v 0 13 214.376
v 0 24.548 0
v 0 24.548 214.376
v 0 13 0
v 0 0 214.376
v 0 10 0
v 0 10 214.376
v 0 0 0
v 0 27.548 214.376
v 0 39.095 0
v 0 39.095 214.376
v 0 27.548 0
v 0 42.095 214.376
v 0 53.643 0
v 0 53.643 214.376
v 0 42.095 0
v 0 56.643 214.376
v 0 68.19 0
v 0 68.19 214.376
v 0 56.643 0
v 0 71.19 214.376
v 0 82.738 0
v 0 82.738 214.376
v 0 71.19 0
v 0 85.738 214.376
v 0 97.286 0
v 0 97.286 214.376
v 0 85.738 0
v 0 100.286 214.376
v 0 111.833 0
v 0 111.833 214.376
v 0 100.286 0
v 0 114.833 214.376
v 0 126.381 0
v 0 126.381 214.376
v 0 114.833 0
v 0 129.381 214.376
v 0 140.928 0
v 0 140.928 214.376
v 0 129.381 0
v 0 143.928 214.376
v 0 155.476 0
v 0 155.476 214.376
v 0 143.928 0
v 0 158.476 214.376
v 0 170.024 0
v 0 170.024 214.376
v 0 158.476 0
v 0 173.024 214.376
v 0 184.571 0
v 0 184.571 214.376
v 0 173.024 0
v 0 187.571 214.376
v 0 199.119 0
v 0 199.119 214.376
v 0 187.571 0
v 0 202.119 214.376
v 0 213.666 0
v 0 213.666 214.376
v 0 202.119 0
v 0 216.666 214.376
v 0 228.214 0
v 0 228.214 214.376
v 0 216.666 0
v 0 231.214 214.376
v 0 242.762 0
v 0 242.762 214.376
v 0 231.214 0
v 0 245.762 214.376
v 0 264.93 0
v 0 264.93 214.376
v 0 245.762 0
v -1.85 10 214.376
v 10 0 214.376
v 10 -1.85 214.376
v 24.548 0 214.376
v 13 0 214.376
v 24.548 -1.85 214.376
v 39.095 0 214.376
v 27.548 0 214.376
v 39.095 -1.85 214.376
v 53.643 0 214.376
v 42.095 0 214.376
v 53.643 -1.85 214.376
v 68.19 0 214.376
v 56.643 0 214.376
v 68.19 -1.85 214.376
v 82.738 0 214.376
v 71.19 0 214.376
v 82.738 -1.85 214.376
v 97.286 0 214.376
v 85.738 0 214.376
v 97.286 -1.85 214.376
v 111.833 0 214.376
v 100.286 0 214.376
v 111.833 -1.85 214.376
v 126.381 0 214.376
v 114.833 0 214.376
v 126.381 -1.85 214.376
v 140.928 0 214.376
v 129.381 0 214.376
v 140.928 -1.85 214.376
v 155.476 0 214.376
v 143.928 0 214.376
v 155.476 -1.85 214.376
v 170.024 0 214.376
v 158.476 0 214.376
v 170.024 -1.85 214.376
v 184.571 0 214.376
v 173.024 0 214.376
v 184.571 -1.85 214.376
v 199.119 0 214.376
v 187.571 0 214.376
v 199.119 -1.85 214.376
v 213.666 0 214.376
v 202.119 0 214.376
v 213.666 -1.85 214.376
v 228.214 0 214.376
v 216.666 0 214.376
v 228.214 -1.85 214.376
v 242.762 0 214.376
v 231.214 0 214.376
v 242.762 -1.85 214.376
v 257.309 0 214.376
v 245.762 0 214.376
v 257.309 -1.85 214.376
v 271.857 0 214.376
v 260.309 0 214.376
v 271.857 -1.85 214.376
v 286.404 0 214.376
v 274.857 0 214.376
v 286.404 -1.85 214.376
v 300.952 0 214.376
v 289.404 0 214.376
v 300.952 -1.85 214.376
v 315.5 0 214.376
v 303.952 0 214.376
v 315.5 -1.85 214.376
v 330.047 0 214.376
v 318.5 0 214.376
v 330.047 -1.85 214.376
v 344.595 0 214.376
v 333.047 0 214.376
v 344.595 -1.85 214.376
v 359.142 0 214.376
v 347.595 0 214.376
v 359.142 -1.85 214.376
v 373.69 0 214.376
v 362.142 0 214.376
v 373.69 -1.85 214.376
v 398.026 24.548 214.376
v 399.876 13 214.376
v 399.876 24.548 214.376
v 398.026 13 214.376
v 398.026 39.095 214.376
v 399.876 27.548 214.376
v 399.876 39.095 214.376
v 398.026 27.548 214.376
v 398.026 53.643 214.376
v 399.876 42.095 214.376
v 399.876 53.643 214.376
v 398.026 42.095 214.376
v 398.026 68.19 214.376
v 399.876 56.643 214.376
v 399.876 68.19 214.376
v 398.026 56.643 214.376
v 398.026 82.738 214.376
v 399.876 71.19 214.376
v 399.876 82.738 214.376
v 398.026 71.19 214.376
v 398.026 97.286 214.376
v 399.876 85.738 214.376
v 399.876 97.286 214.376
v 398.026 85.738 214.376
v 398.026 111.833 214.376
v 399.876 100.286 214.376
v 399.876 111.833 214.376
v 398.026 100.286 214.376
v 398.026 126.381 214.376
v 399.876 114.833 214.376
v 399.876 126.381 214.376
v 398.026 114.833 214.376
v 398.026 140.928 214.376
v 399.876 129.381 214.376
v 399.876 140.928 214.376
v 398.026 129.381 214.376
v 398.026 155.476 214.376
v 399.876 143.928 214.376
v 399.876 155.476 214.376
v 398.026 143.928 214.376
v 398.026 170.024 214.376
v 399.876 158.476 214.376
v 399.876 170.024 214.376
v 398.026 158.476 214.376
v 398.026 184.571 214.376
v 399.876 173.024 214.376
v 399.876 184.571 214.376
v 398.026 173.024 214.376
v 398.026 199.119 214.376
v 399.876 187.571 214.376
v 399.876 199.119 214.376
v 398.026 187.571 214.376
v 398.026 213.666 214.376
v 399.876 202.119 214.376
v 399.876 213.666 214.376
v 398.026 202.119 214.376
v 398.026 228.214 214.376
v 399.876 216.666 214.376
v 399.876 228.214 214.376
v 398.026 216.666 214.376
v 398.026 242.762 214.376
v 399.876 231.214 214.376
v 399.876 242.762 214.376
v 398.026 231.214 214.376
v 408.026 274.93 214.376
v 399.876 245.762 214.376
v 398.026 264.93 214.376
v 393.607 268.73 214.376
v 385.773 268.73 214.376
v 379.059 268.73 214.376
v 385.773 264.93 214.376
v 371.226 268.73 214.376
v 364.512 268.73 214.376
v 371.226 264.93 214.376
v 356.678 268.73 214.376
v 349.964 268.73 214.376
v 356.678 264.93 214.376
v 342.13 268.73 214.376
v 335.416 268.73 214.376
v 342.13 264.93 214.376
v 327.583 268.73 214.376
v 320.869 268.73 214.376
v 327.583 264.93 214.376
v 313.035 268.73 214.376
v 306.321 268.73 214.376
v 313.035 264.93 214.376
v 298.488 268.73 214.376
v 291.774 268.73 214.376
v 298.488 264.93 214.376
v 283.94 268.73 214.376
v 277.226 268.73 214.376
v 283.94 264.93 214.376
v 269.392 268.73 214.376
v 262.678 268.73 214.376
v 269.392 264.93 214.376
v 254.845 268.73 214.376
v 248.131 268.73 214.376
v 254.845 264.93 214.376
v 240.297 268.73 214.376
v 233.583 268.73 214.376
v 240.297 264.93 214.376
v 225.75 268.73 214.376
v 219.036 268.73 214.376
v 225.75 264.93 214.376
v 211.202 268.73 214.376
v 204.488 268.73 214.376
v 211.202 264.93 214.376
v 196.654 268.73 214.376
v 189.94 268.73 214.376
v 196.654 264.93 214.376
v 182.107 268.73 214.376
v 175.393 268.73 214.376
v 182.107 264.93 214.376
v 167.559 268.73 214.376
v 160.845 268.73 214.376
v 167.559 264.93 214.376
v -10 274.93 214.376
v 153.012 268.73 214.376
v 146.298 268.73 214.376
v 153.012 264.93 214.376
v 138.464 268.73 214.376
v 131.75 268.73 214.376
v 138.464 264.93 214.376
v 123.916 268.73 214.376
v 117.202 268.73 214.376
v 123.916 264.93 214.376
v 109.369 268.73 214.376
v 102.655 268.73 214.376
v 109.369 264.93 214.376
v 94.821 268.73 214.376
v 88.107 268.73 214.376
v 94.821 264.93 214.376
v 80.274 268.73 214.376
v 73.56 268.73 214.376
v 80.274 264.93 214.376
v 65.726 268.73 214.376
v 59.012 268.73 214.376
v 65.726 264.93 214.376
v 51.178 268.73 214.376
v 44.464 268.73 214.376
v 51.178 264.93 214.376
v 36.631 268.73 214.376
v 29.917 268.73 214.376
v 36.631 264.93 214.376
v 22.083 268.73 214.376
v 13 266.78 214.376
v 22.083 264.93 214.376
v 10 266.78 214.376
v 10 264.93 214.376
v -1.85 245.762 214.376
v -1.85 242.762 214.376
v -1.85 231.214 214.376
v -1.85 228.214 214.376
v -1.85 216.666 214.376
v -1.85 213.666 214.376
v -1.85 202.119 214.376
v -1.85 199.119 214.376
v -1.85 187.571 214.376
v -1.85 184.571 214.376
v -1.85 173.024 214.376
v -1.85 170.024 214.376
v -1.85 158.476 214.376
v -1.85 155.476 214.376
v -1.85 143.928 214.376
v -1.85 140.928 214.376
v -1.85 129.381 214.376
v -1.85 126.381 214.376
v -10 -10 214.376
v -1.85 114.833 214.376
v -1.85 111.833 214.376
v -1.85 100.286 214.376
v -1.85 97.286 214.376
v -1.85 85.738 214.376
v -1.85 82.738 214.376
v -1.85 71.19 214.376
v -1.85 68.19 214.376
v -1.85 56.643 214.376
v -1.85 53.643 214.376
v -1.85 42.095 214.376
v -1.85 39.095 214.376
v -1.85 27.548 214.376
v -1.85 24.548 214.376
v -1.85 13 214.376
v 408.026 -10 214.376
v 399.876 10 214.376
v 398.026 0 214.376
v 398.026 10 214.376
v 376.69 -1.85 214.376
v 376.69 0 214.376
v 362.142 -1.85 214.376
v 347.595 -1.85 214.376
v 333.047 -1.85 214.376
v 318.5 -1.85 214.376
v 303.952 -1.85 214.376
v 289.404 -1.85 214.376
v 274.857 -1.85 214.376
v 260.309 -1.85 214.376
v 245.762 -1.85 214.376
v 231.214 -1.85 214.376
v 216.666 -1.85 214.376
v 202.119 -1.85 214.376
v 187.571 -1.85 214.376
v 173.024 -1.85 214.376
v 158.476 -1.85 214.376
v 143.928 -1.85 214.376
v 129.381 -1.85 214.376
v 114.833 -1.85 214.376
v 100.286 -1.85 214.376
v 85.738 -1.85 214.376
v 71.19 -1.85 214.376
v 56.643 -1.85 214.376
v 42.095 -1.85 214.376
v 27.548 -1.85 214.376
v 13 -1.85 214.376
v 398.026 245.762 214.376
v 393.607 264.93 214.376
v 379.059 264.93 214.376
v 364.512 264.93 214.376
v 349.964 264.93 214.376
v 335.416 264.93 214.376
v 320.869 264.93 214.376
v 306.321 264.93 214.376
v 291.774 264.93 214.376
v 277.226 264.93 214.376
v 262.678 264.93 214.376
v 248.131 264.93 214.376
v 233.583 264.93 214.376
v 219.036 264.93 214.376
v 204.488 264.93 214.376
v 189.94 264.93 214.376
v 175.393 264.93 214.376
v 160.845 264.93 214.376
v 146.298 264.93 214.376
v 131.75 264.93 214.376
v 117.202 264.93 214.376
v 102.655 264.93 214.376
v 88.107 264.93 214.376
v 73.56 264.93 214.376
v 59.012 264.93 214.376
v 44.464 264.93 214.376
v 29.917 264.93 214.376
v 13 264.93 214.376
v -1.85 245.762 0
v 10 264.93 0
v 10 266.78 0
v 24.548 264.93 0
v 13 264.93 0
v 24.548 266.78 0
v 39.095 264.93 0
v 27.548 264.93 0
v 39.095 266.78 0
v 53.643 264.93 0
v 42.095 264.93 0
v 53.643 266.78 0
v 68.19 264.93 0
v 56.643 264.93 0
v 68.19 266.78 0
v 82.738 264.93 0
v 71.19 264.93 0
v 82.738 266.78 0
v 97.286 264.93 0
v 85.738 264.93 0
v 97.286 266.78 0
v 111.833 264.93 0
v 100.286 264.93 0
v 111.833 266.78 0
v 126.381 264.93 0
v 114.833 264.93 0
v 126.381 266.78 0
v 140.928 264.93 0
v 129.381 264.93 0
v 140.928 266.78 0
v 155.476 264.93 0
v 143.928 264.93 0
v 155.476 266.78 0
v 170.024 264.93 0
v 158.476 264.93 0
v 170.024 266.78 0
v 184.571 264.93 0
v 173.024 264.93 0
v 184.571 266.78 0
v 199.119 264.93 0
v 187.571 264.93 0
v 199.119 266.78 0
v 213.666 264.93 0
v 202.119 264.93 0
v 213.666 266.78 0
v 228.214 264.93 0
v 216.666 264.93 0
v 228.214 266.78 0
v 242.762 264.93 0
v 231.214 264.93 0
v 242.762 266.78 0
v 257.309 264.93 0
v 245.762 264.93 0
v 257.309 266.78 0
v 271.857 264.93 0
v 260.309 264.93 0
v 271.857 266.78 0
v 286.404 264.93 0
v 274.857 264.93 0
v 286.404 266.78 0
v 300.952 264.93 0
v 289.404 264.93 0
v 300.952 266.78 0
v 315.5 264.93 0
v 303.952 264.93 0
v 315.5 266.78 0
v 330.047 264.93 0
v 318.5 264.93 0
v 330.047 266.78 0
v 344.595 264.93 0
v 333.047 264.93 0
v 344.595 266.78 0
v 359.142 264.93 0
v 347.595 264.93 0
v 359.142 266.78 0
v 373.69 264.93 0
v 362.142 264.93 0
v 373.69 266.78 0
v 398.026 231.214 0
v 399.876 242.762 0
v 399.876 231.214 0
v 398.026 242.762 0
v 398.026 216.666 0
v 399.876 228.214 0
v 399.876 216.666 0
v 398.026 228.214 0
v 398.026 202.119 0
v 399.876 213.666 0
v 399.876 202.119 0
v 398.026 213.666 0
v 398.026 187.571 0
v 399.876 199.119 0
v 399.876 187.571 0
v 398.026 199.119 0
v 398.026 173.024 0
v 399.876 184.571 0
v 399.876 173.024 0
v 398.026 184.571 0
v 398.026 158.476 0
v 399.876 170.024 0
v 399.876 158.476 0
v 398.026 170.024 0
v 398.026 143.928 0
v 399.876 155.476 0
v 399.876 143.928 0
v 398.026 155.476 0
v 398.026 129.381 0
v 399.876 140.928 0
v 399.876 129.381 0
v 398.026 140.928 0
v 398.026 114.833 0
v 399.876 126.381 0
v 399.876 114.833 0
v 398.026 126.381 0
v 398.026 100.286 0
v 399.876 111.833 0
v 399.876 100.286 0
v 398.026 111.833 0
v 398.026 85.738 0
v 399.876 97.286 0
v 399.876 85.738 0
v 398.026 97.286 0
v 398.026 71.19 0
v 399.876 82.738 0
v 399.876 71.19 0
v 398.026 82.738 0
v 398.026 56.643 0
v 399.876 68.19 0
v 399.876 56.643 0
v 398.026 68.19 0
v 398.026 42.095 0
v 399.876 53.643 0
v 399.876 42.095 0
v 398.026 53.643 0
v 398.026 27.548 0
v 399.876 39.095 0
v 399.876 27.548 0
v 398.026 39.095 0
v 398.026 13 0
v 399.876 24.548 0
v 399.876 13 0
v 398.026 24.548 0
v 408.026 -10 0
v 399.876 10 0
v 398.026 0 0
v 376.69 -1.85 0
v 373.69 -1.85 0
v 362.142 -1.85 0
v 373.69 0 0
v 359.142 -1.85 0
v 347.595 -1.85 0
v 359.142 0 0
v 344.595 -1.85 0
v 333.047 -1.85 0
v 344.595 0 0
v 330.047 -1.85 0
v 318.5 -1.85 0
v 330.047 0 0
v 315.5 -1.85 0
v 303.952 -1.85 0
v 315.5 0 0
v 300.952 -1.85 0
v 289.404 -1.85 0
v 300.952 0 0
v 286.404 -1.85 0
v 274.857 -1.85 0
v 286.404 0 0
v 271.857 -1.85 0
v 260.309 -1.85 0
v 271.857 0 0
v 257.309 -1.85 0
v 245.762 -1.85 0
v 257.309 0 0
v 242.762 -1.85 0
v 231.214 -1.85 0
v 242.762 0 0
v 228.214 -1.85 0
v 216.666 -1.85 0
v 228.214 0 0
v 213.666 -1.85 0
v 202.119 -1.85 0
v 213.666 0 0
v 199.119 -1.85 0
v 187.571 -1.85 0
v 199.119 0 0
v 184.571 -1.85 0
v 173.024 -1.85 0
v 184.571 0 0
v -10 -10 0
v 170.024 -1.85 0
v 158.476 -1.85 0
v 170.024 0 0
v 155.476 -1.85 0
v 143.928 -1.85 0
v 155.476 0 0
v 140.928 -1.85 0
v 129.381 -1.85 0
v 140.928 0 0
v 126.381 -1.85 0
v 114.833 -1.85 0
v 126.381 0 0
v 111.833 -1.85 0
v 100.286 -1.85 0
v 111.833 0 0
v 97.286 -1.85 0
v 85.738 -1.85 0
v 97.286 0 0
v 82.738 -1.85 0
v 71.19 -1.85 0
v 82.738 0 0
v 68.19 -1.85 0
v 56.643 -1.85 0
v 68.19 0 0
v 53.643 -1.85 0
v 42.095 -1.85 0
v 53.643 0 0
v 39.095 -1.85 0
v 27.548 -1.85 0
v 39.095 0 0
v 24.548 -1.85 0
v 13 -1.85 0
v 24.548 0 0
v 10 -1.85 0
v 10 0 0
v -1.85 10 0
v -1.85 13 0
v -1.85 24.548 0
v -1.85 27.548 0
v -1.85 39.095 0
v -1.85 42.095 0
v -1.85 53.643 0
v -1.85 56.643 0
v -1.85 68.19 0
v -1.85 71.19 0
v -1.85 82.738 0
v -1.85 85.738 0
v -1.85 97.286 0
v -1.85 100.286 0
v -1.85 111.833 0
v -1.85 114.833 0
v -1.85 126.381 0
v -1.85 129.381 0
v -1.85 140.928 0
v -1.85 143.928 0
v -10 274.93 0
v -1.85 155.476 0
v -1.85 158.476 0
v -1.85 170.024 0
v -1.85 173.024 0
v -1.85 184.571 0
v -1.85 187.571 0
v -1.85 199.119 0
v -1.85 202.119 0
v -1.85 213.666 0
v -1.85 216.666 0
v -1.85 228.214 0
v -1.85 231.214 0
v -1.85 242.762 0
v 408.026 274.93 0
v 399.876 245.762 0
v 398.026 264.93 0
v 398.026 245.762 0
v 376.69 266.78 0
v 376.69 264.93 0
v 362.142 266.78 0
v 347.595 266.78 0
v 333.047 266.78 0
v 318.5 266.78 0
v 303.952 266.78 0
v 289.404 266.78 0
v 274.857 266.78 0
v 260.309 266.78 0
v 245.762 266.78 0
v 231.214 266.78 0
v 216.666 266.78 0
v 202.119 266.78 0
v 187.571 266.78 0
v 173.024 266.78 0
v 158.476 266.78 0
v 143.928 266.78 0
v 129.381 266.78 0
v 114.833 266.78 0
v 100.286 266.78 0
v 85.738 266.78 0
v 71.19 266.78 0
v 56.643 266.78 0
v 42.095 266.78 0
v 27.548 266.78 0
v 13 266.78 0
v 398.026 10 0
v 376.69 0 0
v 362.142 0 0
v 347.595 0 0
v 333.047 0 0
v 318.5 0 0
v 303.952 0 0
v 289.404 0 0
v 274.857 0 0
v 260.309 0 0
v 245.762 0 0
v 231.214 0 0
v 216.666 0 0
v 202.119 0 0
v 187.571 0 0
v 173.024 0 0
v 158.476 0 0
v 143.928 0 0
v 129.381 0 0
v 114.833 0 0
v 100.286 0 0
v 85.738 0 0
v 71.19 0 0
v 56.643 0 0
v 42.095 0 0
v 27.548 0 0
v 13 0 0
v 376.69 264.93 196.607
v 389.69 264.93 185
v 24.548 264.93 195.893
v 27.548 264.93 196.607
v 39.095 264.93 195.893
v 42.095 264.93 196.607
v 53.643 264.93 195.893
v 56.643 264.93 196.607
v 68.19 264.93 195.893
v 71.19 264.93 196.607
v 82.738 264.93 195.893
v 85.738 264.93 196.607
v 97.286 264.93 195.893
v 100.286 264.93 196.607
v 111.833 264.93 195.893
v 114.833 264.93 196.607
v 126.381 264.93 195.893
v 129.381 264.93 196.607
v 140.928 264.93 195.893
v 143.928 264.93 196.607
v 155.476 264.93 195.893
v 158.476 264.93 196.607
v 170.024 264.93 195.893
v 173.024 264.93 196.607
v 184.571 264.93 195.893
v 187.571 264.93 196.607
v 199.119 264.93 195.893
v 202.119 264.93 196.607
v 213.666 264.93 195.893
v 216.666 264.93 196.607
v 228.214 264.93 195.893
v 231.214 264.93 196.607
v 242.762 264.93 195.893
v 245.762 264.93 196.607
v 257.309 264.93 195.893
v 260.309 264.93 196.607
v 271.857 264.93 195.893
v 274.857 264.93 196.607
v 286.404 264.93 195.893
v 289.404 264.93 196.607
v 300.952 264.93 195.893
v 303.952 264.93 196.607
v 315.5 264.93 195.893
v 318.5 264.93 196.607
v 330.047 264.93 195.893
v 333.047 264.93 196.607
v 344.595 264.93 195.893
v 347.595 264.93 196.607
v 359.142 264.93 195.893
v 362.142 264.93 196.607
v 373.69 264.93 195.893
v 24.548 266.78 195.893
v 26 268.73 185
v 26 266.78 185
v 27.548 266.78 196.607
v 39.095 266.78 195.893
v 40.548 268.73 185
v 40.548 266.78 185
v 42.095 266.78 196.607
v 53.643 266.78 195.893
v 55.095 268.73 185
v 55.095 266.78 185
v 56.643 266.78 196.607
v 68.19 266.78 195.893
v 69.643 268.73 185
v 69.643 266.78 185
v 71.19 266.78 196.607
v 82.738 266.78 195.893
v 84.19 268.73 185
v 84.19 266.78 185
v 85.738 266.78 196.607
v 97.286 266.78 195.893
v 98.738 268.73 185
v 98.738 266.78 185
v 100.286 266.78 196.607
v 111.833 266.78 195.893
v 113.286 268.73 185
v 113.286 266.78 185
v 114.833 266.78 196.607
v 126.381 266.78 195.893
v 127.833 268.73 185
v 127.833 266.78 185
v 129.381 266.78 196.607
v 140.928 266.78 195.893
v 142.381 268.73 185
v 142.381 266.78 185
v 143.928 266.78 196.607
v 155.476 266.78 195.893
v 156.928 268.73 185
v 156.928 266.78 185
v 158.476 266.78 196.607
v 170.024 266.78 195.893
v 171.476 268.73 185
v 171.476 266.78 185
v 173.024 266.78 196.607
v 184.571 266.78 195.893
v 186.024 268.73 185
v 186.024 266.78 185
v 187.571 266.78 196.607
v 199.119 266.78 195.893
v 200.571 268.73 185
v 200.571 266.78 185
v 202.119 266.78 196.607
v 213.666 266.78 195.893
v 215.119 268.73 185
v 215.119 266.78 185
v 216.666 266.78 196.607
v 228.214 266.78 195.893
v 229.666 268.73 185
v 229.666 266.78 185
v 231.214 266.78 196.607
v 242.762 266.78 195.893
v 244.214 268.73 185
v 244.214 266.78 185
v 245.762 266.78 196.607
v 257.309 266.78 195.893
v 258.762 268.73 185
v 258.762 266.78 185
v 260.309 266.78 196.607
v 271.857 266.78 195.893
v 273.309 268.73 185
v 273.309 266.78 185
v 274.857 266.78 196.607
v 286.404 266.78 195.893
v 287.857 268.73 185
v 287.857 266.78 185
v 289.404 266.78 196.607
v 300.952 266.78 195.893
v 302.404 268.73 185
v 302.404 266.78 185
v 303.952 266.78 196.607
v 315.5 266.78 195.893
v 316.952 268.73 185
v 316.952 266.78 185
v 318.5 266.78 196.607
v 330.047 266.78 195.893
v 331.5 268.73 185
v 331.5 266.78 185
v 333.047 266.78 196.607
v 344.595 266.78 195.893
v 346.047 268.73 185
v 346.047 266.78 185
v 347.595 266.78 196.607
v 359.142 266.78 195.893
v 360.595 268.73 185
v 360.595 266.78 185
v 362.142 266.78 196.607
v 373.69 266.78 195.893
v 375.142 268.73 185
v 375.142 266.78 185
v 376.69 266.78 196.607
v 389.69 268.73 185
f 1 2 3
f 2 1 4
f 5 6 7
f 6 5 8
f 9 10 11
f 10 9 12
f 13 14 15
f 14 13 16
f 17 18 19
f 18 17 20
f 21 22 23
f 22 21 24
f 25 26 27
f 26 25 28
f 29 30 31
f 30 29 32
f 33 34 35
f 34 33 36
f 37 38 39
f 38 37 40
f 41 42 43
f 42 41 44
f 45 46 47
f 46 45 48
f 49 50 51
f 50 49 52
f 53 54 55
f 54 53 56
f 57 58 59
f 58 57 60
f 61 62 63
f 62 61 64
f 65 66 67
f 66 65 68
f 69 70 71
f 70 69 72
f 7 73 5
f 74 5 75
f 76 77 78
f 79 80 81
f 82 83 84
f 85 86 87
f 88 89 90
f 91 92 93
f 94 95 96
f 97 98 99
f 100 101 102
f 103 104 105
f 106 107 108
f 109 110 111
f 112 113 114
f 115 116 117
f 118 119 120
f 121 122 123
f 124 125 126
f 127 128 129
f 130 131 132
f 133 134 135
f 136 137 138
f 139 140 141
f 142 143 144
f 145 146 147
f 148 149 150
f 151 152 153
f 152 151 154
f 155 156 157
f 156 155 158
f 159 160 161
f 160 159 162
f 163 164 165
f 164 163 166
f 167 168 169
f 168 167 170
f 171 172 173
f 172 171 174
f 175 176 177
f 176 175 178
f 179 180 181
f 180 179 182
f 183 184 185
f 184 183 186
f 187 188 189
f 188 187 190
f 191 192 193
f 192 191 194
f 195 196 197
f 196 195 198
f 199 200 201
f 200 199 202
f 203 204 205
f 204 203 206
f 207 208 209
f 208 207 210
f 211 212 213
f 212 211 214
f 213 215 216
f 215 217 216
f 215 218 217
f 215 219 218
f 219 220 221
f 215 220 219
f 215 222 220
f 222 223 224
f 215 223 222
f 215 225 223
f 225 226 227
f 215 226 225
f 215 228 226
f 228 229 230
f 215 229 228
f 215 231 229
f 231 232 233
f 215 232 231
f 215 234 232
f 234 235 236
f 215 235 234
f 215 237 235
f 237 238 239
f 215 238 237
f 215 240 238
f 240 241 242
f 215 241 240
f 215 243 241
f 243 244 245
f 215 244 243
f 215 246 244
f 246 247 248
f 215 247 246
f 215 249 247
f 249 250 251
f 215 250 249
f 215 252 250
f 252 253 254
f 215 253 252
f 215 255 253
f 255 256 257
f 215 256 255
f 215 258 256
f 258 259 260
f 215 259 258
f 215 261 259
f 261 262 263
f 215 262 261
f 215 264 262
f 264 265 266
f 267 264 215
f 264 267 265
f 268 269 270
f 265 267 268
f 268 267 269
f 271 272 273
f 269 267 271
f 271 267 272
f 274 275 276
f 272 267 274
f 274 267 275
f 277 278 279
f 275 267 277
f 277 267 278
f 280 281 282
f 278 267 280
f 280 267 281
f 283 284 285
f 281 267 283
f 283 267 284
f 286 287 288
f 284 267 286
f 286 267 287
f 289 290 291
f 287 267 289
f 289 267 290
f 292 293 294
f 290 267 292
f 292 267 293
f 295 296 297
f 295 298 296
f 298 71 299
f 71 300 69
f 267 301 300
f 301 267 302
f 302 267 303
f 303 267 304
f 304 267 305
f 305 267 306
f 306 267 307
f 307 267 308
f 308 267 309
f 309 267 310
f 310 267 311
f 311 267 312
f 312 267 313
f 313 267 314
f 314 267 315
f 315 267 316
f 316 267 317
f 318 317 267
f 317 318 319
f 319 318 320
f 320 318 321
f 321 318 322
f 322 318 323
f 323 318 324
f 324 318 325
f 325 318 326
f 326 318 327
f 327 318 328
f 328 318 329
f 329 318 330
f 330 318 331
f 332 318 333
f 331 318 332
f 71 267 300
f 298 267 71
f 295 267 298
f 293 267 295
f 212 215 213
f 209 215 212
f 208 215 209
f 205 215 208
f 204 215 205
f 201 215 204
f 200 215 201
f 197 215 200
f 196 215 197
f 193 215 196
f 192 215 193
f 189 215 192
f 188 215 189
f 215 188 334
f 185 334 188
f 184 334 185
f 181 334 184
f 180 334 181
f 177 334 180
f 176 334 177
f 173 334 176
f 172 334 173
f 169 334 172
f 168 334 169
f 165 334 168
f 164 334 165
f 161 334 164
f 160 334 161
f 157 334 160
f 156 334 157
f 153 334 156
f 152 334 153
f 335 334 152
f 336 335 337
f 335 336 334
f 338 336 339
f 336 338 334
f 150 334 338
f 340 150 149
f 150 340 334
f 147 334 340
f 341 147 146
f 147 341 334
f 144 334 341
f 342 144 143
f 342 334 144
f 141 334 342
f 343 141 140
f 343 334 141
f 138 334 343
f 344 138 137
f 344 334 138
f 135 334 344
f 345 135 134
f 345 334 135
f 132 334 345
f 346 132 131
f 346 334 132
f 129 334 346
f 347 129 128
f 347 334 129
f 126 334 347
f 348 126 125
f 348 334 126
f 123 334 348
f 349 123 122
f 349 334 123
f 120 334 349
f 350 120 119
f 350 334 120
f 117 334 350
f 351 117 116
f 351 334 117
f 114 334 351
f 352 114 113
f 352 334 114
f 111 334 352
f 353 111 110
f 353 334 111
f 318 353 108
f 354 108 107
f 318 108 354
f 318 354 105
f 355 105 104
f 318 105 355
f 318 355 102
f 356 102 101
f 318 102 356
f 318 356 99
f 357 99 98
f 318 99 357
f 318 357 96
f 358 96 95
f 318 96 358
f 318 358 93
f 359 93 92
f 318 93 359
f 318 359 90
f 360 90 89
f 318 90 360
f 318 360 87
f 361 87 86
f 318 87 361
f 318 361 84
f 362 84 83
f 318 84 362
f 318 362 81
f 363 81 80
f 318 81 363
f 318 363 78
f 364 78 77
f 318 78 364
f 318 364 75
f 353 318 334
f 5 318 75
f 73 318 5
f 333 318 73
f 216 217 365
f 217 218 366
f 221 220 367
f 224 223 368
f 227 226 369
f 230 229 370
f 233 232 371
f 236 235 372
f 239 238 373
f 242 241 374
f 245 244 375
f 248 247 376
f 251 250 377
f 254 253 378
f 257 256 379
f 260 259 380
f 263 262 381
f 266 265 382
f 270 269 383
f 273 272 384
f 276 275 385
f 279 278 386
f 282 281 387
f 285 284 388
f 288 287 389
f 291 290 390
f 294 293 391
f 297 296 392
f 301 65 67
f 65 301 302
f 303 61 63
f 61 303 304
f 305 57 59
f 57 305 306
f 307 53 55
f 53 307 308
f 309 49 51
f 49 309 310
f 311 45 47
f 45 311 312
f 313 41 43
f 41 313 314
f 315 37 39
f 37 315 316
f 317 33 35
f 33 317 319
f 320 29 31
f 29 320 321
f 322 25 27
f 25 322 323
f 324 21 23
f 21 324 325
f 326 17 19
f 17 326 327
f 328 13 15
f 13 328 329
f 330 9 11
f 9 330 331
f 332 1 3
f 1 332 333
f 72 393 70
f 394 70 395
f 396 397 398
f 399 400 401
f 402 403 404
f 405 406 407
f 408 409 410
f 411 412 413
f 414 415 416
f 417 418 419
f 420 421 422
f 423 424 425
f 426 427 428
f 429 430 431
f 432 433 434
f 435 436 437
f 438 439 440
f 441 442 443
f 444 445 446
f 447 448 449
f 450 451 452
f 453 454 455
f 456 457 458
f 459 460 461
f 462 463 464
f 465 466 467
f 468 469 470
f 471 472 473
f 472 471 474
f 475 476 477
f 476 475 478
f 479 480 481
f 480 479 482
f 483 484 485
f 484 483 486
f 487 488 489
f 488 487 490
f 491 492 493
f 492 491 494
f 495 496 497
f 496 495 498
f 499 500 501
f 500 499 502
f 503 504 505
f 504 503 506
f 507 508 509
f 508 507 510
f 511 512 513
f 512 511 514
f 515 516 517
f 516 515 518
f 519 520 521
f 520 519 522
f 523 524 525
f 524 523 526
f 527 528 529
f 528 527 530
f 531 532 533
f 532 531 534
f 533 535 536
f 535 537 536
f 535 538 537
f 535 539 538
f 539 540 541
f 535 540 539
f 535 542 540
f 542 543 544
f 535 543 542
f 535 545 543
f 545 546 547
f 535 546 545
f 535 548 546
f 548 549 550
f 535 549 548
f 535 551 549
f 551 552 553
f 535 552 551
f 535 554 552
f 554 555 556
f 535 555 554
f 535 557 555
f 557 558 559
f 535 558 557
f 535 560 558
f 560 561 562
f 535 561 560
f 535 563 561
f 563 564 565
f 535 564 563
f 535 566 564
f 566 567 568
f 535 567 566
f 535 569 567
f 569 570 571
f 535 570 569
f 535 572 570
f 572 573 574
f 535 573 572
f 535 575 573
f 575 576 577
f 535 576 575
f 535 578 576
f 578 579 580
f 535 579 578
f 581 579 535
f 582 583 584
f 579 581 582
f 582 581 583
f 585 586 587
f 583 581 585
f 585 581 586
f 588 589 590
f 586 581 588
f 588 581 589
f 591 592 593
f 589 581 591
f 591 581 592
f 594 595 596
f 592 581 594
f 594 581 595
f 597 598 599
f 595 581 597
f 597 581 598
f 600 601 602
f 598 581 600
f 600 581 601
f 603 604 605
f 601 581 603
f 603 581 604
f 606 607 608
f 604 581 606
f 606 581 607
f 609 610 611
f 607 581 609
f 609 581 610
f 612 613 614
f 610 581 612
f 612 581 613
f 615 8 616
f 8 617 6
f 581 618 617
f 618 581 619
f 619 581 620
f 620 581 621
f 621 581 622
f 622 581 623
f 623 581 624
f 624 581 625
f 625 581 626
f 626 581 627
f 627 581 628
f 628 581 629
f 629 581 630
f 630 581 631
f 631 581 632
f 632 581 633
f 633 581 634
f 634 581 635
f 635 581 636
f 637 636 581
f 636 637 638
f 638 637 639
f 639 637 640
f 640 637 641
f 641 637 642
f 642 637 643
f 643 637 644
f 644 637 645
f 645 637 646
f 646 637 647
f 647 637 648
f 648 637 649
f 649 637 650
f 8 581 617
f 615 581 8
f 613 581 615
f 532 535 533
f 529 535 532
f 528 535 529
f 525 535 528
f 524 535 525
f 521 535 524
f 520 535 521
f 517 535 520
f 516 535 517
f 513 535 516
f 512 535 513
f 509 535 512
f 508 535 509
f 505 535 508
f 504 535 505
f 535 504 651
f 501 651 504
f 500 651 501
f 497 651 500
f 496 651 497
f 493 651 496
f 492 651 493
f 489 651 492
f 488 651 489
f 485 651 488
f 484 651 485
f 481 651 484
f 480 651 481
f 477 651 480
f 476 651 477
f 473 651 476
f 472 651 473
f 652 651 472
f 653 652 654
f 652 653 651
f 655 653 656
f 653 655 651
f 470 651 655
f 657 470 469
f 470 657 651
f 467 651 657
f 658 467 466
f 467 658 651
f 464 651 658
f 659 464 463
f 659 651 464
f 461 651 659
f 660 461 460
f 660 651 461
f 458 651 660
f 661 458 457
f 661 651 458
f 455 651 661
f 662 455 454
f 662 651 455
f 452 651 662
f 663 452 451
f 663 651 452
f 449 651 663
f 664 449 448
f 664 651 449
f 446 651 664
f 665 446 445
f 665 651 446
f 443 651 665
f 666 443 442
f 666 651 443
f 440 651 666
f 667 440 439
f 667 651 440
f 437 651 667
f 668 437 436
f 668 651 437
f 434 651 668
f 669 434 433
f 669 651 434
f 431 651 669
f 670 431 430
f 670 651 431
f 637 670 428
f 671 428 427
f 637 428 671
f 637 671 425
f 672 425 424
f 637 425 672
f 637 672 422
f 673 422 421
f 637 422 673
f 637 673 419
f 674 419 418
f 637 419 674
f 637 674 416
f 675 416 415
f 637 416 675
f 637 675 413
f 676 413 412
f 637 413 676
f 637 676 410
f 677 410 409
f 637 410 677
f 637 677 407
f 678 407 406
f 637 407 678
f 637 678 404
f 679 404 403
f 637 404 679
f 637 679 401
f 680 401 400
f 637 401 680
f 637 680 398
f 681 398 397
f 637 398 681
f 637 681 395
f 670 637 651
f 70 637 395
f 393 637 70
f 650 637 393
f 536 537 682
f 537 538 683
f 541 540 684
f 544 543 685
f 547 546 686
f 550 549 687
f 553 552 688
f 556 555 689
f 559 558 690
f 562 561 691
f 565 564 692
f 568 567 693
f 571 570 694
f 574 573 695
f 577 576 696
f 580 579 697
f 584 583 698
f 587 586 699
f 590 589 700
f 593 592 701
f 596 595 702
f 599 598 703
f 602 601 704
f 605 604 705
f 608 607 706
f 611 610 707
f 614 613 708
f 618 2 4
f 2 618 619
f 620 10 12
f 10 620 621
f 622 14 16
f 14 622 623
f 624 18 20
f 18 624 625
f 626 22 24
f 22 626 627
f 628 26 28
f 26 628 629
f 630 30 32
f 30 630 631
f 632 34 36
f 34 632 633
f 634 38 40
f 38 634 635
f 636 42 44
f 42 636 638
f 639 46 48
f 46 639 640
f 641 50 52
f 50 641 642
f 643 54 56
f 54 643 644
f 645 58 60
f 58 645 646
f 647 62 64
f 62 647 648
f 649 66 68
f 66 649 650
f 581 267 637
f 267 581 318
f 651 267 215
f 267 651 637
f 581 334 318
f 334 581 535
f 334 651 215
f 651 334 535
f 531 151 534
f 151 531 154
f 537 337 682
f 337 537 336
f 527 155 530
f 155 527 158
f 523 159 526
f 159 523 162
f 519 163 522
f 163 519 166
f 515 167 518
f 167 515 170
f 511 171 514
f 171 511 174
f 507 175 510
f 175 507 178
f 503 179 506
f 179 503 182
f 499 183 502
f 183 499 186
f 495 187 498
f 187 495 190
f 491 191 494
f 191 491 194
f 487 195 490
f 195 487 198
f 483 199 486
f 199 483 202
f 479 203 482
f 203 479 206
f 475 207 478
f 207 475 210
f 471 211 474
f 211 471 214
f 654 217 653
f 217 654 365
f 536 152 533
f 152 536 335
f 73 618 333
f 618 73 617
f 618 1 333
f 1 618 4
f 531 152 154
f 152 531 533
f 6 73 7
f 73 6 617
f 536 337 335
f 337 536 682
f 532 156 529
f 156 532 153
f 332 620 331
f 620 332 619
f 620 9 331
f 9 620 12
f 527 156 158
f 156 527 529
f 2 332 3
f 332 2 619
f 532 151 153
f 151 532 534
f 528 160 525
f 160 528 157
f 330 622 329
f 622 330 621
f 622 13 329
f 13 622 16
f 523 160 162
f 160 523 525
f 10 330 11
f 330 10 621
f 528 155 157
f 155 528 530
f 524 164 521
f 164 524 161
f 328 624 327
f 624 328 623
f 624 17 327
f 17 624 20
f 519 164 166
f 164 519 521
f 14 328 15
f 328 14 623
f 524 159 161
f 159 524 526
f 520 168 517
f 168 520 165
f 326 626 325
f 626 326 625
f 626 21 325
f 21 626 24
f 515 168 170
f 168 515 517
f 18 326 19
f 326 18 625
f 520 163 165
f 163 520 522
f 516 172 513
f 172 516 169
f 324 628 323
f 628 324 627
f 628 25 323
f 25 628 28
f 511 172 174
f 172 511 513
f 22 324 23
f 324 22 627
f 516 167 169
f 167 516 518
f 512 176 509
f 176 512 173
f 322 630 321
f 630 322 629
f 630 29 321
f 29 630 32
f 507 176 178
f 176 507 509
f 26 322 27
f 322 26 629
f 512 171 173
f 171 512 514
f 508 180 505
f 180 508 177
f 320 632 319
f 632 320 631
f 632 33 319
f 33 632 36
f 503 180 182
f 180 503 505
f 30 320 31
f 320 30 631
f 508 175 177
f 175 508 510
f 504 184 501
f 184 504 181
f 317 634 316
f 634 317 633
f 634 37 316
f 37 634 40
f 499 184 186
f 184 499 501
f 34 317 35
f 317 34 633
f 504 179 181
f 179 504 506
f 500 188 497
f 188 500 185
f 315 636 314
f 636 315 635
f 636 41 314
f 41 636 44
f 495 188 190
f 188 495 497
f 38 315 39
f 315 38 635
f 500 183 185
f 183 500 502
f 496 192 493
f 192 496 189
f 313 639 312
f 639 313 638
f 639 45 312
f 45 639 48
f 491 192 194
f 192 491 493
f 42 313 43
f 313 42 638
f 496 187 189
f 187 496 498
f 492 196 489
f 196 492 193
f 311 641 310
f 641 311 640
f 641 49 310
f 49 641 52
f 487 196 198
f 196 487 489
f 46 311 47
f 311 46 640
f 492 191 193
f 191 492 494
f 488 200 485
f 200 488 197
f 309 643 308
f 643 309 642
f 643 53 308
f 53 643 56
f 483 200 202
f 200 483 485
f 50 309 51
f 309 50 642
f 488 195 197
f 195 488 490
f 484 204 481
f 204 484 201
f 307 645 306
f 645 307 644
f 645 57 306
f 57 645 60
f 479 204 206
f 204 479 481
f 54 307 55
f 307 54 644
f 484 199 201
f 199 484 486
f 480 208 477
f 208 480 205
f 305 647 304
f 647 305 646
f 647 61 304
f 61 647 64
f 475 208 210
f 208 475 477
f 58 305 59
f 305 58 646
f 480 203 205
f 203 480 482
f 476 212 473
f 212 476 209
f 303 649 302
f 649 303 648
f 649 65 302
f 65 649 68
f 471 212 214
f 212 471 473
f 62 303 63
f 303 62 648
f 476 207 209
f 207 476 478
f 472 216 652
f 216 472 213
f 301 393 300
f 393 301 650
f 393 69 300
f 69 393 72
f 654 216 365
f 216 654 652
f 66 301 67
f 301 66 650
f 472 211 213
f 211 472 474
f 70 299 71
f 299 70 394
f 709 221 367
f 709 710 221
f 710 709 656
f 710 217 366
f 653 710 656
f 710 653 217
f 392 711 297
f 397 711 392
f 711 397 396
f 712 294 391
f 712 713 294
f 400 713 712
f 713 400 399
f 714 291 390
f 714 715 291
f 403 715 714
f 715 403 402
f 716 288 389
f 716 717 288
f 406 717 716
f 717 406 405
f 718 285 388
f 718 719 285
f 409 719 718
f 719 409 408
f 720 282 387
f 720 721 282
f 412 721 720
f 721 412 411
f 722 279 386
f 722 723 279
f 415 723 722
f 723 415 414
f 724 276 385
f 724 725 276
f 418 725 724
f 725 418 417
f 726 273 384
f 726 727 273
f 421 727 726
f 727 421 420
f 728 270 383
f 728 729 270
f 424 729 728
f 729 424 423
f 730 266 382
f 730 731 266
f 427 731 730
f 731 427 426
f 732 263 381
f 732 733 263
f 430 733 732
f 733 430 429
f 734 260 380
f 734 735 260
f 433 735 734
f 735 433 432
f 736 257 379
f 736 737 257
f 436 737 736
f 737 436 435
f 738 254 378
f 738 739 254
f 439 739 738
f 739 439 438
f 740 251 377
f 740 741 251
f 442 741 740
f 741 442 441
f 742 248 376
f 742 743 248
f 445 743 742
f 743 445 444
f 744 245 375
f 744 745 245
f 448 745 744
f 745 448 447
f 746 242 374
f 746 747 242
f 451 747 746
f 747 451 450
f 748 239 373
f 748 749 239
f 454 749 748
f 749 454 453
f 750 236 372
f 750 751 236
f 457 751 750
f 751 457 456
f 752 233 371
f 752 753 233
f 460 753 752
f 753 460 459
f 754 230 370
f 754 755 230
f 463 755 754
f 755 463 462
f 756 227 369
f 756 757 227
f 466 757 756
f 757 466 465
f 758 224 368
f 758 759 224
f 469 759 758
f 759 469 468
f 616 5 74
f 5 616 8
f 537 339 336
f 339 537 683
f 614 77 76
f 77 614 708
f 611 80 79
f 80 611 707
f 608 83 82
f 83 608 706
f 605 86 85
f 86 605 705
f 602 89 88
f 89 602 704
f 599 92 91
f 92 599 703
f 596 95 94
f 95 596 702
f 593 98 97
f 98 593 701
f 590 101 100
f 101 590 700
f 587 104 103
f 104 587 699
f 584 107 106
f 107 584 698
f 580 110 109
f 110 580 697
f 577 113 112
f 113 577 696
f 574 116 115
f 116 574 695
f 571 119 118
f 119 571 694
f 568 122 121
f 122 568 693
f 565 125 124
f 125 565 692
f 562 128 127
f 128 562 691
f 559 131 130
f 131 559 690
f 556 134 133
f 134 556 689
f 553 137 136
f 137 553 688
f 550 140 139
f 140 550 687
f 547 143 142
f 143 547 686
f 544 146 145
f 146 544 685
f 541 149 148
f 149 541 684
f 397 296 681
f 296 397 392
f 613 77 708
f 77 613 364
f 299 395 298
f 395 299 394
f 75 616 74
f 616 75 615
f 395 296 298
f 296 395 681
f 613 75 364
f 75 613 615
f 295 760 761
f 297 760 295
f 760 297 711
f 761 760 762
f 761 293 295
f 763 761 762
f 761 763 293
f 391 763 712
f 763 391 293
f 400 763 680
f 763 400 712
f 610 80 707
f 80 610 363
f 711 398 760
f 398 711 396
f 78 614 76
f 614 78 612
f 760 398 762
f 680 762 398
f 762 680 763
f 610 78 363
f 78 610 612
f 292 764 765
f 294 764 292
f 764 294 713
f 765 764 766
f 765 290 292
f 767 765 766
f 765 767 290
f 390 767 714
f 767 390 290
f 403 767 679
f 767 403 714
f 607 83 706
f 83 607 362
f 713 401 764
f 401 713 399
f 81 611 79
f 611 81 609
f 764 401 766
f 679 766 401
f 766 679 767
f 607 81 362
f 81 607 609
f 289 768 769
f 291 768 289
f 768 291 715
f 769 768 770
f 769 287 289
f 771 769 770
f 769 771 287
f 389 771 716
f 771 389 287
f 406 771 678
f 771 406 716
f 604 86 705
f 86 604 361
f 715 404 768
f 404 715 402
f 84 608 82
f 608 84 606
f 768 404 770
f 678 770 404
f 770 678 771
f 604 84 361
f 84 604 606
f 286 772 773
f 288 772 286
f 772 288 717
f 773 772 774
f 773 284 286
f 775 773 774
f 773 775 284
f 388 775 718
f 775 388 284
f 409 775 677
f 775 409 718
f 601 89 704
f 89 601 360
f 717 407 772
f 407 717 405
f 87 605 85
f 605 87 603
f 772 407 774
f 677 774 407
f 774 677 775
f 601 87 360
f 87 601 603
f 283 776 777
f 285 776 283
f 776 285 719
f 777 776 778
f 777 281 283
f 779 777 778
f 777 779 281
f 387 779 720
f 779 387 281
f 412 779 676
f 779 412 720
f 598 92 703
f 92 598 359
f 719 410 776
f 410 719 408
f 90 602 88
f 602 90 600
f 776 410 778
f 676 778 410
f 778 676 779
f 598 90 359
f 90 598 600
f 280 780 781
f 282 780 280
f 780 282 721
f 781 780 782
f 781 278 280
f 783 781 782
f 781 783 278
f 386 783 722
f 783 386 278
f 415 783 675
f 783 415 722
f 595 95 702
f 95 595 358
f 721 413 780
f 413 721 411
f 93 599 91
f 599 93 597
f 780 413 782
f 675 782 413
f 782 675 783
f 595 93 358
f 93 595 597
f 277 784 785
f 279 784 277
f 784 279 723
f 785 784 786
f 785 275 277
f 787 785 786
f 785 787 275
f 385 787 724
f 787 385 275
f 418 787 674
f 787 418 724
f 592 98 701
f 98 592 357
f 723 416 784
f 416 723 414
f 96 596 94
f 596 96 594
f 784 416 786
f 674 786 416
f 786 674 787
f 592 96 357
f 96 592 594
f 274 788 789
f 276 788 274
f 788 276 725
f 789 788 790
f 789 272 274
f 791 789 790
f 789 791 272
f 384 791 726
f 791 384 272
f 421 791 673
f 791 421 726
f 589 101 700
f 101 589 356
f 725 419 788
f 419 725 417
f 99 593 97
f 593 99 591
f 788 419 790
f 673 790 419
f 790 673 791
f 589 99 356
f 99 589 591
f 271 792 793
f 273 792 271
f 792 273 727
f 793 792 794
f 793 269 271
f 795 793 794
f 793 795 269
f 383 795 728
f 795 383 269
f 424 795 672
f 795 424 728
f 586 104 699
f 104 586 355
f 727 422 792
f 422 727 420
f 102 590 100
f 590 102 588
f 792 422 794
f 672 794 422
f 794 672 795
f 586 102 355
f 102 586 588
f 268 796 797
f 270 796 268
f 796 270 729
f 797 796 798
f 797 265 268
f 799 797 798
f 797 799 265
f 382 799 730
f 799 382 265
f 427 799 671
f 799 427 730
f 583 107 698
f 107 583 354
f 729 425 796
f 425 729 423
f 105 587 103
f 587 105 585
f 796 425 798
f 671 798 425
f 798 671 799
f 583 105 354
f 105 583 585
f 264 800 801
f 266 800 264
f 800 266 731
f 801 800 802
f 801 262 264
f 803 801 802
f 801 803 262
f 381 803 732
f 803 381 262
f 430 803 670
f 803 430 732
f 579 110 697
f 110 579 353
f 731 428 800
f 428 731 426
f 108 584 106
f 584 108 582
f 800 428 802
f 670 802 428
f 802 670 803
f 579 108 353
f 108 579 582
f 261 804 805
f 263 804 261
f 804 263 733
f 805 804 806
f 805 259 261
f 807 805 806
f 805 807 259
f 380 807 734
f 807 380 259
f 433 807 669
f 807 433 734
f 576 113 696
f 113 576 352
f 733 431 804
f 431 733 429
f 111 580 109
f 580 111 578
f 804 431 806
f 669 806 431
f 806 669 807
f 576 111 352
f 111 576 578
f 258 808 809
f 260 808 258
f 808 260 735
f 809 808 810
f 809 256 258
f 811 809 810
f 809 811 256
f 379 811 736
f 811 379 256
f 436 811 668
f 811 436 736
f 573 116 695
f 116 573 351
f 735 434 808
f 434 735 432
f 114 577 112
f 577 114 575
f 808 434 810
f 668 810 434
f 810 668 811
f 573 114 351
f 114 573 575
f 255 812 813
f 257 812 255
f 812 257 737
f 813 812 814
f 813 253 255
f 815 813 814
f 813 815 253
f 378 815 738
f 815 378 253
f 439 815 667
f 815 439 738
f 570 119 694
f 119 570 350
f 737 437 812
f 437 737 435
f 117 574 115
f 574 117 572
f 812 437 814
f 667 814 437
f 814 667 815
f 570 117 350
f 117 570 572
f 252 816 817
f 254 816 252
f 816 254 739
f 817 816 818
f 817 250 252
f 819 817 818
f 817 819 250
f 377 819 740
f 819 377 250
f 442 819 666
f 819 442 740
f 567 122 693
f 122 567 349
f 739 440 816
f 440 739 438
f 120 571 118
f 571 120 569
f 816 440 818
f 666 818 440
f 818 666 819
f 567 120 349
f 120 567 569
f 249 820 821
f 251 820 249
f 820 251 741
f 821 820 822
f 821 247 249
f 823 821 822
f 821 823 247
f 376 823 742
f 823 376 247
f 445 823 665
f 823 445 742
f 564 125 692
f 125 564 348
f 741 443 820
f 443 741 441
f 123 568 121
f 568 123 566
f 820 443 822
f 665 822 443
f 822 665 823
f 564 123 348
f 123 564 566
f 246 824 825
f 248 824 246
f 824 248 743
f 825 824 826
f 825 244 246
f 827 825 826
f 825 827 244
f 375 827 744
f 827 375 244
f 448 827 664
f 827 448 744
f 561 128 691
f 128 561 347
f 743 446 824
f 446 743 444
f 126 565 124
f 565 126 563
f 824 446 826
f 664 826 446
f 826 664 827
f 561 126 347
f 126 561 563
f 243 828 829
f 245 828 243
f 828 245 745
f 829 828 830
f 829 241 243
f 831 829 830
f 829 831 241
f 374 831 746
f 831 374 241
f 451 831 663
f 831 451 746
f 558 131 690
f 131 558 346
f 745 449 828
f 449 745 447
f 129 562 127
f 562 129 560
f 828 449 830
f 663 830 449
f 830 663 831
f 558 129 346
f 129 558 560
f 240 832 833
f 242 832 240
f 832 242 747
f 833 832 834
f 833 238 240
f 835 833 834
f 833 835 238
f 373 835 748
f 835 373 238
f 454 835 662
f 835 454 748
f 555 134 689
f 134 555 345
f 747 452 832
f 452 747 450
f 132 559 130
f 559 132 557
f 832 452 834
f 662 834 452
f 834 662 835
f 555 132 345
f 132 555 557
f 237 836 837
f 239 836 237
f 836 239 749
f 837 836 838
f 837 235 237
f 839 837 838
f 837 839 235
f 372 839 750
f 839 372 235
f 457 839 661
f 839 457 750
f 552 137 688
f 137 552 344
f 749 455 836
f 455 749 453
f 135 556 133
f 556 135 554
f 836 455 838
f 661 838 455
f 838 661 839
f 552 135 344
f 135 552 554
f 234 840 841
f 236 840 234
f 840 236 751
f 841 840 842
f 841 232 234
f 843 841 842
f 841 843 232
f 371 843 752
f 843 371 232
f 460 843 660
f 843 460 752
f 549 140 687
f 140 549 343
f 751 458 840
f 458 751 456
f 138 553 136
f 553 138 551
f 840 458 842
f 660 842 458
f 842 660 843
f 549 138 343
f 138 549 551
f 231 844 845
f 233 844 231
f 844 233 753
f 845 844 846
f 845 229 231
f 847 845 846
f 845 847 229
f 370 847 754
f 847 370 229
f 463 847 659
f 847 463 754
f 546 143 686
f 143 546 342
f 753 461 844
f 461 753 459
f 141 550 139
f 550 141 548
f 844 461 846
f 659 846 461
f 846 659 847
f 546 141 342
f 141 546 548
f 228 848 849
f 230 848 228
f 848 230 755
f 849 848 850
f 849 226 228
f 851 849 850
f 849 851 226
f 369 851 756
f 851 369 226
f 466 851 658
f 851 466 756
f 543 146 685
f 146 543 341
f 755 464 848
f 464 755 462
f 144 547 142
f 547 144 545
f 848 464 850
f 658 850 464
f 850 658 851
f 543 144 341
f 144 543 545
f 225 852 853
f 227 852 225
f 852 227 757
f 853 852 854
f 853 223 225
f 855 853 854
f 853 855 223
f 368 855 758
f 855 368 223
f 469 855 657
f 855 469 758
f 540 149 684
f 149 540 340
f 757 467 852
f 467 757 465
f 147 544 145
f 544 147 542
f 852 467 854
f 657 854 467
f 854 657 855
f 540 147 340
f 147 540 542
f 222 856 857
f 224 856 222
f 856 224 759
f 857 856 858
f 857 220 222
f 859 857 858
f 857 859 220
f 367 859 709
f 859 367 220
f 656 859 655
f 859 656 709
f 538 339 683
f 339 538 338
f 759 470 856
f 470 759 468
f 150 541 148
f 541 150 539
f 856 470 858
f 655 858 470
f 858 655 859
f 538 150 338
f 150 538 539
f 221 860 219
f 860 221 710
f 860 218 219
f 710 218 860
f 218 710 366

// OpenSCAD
// All dimensions in mm unless scaled to inch

// Hard dimensions

inch = 25.4;

hex_board_w = 15.69 * inch;
quad_board_w = 10.45 * inch;
dual_board_w = 5.19 * inch;
single_board_w = 2.44 * inch;
board_h = 8.44 * inch;
half_board_h = 4.94 * inch;
component_clearance = 0.063 * inch; // From edge of board to component area
component_h = 0.375 * inch; // From board surface to top of tallest compoent
solder_leads_clearance = 0.063 * inch;
board_thickness = 0.056 * inch;

// Soft dimensions

box_wall_w = 10;
handle_slot_w = 5;
handle_slot_h = 5;
first_slot_clearance = 10;
slot_width = 3;
slot_clearance = 0.25; // Extra wiggle room on each side of board
board_h_clearance = 2; // From tallest component to next board

steer_length = 30;      // instyrning av kortet

// calculated dimensions

slot_depth = component_clearance + slot_clearance;
box_inner_w = hex_board_w + 2*component_clearance - 2*slot_depth;
box_inner_d = quad_board_w + 2*component_clearance - 2*slot_depth;
quad_slot_w = box_inner_d + 2*slot_depth;
hex_slot_w = box_inner_w + 2*slot_depth;
box_wall_h = board_h;
board_unit = solder_leads_clearance + board_thickness + component_h + board_h_clearance;
number_of_hex_slots = floor((box_inner_d - first_slot_clearance - board_unit) / board_unit);
number_of_quad_slots = floor((box_inner_w - first_slot_clearance - board_unit) / board_unit);

// Functional layout

// Short sides
difference() {
    union() {
        translate([-box_wall_w, -10, 0])
            cube([box_wall_w,box_inner_d+20,box_wall_h]);
        translate([box_inner_w, -10, 0])
            cube([box_wall_w,box_inner_d+20, box_wall_h]);
    }
    hex_slots();
}
    




// Long sides
difference() {
    union() {
        translate([0, box_inner_d, 0])
            cube([box_inner_w, box_wall_w, box_wall_h]);
        translate([0, -box_wall_w, 0])
            cube([box_inner_w, box_wall_w, box_wall_h]);
    }
    quad_slots();
}


module quad_slots() {
    translate([first_slot_clearance, -slot_depth, -1]) {
        for(i = [0: number_of_quad_slots]) {
            translate([i * board_unit, 0, 0])
            union() {
                cube([slot_width, quad_slot_w, box_wall_h + 2]);   //Pih
                     translate([first_slot_clearance+6, slot_depth+0.1, 186])
                    rotate([0,-90,-90])
                        #steer();
            }
       }
        
    }
}

module hex_slots() {
    translate([-slot_depth, first_slot_clearance, -1]) {
        for(i = [0: number_of_hex_slots]) {
            translate([0, i * board_unit, 0] )
                cube([hex_slot_w, slot_width, box_wall_h + 2]);
        }
    }
}

module steer() {
    linear_extrude(quad_slot_w)                              //+0.1 för att OS kräver det se rad 70
        polygon([[0,0],[steer_length,-4],[steer_length,4]]);    
}


    //smarting
    
    
    
    
    
    
    
    
